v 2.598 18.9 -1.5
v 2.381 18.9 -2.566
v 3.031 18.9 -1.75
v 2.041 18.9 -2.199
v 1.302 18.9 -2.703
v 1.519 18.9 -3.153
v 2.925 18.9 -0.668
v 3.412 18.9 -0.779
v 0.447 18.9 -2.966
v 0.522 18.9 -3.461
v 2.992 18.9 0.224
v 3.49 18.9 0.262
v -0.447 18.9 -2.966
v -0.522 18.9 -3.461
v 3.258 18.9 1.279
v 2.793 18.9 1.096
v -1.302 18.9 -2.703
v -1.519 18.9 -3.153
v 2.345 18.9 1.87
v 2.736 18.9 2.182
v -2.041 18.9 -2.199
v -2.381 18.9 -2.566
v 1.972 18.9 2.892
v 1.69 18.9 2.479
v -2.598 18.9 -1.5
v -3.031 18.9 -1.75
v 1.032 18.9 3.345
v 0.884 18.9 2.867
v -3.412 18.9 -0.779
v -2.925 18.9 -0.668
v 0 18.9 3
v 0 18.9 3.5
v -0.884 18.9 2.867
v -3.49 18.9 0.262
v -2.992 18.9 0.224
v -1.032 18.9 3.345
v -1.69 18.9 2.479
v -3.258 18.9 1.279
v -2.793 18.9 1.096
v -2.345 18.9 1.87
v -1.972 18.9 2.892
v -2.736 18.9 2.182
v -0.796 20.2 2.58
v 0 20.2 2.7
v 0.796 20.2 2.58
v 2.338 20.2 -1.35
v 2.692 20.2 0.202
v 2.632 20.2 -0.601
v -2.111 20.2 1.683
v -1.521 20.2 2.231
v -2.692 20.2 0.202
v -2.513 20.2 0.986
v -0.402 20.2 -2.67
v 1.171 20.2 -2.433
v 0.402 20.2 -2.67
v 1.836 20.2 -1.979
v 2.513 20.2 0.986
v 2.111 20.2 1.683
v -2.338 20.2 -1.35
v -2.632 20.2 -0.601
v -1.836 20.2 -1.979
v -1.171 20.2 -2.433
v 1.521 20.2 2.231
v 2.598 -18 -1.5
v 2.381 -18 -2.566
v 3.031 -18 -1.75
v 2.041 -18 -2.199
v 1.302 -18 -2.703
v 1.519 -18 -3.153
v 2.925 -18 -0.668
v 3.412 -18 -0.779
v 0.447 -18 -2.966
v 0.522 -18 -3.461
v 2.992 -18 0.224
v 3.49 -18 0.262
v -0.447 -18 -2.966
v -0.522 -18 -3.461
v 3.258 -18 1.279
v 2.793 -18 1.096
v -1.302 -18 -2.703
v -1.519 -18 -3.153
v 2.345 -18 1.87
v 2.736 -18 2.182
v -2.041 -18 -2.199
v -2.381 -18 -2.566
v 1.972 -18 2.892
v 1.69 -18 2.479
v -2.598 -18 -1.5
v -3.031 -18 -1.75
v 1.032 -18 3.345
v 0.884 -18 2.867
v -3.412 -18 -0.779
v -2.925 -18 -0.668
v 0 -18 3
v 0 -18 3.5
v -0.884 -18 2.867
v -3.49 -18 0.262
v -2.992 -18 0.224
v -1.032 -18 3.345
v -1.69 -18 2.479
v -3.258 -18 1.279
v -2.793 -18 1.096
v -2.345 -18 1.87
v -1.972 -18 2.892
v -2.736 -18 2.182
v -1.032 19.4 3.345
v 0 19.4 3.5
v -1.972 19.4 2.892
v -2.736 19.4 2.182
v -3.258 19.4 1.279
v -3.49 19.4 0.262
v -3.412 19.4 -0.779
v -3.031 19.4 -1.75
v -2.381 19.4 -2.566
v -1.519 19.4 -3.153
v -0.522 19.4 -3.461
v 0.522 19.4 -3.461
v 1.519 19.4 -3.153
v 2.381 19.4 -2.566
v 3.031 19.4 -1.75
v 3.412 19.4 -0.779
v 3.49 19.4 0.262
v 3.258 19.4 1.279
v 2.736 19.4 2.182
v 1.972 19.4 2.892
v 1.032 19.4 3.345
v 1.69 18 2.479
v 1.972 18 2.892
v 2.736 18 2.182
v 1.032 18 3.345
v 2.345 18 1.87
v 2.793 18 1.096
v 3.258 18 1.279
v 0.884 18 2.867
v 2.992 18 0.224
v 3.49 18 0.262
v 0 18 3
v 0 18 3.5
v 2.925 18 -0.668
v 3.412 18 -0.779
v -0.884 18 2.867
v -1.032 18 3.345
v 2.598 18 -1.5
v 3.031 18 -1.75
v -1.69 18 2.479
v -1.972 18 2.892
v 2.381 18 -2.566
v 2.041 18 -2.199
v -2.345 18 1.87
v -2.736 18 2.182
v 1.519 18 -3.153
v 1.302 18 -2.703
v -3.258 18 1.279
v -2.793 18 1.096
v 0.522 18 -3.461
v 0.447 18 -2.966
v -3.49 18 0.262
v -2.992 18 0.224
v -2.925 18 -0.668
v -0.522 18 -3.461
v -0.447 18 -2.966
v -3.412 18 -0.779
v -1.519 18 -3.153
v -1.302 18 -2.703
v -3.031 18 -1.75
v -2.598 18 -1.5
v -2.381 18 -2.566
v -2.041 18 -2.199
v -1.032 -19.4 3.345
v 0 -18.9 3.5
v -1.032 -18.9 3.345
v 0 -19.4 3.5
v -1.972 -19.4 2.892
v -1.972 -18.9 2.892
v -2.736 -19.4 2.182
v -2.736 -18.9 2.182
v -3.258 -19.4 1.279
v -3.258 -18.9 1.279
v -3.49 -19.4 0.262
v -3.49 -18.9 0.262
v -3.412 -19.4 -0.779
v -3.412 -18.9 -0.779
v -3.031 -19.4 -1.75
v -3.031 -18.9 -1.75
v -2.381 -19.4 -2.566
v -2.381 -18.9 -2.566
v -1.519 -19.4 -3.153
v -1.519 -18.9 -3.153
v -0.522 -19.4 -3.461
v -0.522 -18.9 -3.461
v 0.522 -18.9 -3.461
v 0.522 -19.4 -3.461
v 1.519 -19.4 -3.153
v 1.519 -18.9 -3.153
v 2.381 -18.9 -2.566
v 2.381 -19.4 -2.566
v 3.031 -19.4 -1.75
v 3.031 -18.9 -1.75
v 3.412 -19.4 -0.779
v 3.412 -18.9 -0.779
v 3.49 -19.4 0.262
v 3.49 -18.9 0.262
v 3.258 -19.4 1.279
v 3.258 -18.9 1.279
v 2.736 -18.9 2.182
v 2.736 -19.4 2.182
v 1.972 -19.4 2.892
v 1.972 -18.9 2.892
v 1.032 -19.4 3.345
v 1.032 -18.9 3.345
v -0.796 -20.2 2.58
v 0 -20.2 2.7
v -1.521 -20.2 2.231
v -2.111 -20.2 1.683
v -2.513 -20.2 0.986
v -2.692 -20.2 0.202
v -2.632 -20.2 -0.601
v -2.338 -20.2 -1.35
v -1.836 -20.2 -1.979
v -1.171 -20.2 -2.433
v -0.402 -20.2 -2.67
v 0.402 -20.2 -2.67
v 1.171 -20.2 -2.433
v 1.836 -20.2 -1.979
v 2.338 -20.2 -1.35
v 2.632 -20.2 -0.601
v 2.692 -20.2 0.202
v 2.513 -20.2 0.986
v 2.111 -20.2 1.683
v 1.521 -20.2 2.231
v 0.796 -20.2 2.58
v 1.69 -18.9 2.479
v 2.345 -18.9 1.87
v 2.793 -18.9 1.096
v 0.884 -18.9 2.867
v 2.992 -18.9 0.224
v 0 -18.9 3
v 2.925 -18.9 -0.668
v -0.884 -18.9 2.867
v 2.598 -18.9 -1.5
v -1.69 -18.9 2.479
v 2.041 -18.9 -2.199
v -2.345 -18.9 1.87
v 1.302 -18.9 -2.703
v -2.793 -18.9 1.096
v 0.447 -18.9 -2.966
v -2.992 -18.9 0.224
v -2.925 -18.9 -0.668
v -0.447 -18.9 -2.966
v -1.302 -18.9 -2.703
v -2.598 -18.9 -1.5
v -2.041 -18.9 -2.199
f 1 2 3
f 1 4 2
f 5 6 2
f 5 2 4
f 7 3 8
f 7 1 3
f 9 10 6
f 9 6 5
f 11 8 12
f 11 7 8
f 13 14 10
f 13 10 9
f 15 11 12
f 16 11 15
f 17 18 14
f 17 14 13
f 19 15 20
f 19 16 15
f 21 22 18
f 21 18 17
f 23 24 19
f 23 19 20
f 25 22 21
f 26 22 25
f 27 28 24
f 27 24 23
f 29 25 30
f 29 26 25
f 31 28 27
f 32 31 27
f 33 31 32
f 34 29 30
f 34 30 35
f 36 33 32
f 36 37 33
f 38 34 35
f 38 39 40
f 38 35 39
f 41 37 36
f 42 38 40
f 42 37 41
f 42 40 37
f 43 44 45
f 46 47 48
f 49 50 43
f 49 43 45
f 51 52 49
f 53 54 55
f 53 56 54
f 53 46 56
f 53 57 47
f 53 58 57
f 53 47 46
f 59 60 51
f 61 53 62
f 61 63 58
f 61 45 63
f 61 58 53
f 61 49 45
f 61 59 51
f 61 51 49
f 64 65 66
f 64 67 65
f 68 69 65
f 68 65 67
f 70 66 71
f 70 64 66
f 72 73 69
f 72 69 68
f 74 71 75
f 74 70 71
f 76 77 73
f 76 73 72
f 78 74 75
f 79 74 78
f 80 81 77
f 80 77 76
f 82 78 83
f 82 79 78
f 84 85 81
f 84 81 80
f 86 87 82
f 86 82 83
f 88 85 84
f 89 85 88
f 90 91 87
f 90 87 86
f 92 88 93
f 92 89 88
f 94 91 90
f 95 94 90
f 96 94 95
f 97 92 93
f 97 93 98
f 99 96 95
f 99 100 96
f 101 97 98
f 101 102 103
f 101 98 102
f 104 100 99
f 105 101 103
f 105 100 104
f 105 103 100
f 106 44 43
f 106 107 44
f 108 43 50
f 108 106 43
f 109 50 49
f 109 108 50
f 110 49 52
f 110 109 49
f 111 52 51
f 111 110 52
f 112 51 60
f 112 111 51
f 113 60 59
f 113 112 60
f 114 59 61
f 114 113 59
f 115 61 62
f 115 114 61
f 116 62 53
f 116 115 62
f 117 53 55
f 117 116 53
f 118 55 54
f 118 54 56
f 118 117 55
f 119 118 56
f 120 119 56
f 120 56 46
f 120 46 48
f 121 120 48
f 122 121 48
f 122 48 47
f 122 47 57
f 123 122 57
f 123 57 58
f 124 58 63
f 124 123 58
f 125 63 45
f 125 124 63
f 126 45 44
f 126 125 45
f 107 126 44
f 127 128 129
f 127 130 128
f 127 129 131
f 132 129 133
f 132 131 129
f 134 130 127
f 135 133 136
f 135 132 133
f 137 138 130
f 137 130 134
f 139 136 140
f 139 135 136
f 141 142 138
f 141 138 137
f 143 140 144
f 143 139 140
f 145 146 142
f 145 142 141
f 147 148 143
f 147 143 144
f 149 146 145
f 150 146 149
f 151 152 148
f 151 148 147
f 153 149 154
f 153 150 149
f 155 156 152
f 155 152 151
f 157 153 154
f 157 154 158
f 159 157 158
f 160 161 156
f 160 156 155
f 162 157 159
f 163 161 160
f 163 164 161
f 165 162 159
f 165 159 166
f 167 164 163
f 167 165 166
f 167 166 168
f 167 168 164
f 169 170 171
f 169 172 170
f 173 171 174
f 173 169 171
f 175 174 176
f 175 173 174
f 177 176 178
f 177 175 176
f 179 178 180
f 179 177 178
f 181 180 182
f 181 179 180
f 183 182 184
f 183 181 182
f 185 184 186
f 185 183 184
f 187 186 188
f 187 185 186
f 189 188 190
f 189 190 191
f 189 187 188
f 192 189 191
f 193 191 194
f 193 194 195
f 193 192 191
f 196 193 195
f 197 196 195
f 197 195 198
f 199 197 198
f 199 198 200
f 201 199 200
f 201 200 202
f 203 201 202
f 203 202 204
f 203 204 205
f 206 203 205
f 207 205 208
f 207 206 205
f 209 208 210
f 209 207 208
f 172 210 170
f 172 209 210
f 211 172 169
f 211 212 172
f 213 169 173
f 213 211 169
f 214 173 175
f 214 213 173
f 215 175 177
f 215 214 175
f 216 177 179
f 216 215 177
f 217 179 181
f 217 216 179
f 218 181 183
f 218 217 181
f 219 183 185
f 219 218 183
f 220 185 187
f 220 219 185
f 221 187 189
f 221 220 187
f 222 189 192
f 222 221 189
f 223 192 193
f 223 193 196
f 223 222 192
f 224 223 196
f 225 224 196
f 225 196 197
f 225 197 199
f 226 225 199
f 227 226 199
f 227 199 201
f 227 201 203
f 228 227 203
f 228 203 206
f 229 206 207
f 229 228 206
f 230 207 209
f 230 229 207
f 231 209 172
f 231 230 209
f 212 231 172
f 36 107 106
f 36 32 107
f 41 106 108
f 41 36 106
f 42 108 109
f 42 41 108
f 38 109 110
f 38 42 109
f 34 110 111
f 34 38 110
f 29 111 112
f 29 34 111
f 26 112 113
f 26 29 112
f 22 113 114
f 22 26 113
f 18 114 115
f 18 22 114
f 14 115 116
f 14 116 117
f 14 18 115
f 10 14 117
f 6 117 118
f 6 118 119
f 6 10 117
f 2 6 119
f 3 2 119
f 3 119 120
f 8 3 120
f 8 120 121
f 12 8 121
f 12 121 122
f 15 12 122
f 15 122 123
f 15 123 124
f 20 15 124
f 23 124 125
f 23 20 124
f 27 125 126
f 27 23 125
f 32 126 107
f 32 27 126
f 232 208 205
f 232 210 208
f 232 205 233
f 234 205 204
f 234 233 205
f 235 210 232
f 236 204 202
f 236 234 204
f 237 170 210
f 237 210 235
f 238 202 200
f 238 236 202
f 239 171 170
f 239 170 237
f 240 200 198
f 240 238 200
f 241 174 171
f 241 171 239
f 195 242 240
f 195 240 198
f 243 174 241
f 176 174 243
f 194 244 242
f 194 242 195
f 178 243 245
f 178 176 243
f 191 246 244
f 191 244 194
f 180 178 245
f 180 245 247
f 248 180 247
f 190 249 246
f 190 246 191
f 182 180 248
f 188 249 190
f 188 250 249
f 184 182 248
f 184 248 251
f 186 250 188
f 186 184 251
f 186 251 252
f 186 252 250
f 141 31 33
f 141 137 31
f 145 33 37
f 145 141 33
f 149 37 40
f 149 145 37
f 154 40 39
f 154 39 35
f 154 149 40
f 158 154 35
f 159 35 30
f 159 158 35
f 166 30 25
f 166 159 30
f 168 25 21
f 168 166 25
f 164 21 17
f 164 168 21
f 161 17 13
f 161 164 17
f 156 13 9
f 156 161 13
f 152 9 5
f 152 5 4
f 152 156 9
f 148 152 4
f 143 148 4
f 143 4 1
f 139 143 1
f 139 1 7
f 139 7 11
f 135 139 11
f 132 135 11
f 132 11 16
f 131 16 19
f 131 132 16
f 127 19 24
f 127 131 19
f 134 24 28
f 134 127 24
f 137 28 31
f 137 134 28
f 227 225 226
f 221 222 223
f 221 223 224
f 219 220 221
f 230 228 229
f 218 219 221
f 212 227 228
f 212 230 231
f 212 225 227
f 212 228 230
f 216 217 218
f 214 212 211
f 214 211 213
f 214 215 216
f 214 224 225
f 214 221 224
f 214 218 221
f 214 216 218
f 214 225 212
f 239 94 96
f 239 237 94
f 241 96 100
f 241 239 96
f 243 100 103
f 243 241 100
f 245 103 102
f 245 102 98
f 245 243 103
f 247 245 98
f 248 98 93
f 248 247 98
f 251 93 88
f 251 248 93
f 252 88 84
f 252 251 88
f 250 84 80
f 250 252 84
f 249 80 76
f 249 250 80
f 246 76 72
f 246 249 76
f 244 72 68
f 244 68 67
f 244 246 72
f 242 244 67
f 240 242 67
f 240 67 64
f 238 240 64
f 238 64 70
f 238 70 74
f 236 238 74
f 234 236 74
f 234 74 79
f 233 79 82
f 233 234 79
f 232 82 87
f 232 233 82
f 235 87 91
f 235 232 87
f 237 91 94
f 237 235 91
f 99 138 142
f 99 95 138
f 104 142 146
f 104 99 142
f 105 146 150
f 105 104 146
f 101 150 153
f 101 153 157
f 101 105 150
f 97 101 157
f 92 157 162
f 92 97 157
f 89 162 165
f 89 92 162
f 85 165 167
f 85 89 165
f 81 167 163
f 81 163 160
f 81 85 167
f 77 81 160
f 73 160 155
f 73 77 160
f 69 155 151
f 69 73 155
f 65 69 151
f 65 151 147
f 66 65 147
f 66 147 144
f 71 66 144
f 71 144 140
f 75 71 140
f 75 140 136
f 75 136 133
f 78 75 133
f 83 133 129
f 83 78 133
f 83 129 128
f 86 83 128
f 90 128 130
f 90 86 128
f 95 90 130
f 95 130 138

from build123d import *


with BuildPart() as part:
    # Esquisse1 → Base-Révolution (revolve)
    with BuildSketch(Plane(origin=(0, 0, 0), x_dir=(-0.25533200274967977, 0, -0.9668534368619877), z_dir=(0.9668534368619877, 0, -0.25533200274967977))):
        Polygon((-3.5, 18), (-3.5, -18), (-3, -18), (-3, -18.9), (-3.5, -18.9), (-3.5, -19.4), (-2.7, -20.2), (0, -20.2), (0, 20.2), (-2.7, 20.2), (-3.5, 19.4), (-3.5, 18.9), (-3, 18.9), (-3, 18), align=None)
    revolve(axis=Axis((0, 0, 0), (0, -1, 0)))


solid = part.part
